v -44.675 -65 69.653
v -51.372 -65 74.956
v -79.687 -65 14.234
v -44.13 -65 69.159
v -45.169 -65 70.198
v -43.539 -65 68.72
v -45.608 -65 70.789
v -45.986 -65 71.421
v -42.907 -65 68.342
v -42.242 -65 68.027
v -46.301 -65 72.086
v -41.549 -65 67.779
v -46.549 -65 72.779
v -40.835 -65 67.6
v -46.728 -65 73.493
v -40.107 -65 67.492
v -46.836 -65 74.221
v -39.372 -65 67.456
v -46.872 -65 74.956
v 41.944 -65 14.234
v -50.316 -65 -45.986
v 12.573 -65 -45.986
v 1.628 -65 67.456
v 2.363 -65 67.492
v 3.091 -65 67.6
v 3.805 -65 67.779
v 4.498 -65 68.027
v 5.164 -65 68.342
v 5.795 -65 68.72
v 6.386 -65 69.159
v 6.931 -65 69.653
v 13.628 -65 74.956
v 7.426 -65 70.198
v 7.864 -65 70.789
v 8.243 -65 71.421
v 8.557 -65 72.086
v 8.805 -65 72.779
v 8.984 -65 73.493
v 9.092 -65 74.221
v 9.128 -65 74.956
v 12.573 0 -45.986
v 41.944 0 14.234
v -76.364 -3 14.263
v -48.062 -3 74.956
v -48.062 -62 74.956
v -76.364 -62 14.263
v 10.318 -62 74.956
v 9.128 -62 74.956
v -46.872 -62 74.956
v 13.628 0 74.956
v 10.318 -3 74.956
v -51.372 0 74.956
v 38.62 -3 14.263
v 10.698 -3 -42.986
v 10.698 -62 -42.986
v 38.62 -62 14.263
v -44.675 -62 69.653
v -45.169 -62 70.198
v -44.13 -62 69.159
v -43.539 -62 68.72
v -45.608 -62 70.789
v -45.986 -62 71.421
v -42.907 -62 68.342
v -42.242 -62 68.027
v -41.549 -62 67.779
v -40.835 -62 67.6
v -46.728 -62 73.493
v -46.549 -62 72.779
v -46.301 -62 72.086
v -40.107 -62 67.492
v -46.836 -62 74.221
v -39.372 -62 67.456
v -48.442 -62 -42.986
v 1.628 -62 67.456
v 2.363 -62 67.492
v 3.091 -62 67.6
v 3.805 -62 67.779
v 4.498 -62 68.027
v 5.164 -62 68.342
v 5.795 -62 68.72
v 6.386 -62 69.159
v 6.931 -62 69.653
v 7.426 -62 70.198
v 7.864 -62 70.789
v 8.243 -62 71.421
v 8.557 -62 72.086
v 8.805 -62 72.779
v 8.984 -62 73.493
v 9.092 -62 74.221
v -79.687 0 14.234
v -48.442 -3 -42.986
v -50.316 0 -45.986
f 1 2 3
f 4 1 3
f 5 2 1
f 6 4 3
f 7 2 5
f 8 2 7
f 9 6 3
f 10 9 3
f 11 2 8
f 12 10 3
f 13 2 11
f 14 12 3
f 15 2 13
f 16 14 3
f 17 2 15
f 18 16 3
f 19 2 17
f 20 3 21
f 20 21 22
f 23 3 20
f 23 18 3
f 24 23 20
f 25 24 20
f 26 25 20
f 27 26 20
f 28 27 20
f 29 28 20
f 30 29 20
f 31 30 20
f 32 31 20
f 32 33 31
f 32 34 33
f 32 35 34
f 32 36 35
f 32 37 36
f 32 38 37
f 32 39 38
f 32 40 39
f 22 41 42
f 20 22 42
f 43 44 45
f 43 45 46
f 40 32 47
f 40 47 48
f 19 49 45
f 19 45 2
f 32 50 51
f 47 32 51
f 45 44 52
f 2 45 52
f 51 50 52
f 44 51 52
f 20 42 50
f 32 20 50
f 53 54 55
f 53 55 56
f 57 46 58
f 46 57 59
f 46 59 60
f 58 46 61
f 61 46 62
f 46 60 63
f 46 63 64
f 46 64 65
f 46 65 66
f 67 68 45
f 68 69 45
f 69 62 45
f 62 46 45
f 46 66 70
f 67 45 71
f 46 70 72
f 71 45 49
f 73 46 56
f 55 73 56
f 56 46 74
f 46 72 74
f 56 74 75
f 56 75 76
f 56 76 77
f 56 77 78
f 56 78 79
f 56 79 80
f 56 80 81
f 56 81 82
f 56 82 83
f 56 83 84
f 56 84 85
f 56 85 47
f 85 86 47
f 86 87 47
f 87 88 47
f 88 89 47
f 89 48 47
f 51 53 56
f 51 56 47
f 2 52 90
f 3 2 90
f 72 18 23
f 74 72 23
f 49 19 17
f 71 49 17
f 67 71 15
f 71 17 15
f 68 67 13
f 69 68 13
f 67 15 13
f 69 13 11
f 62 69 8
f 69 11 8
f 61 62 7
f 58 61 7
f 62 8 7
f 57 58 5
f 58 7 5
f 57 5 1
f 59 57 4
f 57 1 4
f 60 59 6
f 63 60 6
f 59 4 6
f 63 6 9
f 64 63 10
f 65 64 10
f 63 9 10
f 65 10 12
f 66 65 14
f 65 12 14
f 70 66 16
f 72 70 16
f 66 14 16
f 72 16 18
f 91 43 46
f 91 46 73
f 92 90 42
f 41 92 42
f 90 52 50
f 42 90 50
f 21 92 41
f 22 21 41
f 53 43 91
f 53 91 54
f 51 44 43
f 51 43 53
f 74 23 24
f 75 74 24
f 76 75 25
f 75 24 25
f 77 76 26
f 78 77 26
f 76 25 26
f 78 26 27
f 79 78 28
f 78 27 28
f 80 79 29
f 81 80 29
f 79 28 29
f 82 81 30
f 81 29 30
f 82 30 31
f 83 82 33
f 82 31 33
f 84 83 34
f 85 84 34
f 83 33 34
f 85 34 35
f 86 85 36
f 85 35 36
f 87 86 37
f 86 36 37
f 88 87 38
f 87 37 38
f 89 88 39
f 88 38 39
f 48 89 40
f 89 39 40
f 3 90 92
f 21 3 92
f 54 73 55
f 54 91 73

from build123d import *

# Parameters (mm, degrees)
F1_DEPTH = 65
F2_T     = -3
F4_DEPTH = 25


with BuildPart() as f1:
    # F0 (on Front) → F1 (new body)
    with BuildSketch(Plane.XZ):
        Polygon((13.628195, 74.95626), (-51.371805, 74.95626), (-79.687228, 14.233638), (-50.316361, -45.985563), (12.572752, -45.985563), (41.943619, 14.233638), align=None)
    extrude(amount=F1_DEPTH)

    # F2
    f2_openings = [f1.faces().sort_by_distance(p)[0] for p in [
        (-18.871805, -32.5, 74.95626),
    ]]
    offset(amount=F2_T, openings=f2_openings)

    # F3 (on face) → F4 (cut)
    with BuildSketch(Plane.XZ.offset(65)):
        with BuildLine():
            ThreePointArc((-46.871805, 74.95626), (-44.675105, 69.652959), (-39.371805, 67.45626))
            Line((-39.371805, 67.45626), (1.628195, 67.45626))
            ThreePointArc((1.628195, 67.45626), (6.931496, 69.652959), (9.128195, 74.95626))
            Line((9.128195, 74.95626), (-46.871805, 74.95626))
        make_face()
    extrude(amount=-F4_DEPTH, mode=Mode.SUBTRACT)


solid = f1.part
